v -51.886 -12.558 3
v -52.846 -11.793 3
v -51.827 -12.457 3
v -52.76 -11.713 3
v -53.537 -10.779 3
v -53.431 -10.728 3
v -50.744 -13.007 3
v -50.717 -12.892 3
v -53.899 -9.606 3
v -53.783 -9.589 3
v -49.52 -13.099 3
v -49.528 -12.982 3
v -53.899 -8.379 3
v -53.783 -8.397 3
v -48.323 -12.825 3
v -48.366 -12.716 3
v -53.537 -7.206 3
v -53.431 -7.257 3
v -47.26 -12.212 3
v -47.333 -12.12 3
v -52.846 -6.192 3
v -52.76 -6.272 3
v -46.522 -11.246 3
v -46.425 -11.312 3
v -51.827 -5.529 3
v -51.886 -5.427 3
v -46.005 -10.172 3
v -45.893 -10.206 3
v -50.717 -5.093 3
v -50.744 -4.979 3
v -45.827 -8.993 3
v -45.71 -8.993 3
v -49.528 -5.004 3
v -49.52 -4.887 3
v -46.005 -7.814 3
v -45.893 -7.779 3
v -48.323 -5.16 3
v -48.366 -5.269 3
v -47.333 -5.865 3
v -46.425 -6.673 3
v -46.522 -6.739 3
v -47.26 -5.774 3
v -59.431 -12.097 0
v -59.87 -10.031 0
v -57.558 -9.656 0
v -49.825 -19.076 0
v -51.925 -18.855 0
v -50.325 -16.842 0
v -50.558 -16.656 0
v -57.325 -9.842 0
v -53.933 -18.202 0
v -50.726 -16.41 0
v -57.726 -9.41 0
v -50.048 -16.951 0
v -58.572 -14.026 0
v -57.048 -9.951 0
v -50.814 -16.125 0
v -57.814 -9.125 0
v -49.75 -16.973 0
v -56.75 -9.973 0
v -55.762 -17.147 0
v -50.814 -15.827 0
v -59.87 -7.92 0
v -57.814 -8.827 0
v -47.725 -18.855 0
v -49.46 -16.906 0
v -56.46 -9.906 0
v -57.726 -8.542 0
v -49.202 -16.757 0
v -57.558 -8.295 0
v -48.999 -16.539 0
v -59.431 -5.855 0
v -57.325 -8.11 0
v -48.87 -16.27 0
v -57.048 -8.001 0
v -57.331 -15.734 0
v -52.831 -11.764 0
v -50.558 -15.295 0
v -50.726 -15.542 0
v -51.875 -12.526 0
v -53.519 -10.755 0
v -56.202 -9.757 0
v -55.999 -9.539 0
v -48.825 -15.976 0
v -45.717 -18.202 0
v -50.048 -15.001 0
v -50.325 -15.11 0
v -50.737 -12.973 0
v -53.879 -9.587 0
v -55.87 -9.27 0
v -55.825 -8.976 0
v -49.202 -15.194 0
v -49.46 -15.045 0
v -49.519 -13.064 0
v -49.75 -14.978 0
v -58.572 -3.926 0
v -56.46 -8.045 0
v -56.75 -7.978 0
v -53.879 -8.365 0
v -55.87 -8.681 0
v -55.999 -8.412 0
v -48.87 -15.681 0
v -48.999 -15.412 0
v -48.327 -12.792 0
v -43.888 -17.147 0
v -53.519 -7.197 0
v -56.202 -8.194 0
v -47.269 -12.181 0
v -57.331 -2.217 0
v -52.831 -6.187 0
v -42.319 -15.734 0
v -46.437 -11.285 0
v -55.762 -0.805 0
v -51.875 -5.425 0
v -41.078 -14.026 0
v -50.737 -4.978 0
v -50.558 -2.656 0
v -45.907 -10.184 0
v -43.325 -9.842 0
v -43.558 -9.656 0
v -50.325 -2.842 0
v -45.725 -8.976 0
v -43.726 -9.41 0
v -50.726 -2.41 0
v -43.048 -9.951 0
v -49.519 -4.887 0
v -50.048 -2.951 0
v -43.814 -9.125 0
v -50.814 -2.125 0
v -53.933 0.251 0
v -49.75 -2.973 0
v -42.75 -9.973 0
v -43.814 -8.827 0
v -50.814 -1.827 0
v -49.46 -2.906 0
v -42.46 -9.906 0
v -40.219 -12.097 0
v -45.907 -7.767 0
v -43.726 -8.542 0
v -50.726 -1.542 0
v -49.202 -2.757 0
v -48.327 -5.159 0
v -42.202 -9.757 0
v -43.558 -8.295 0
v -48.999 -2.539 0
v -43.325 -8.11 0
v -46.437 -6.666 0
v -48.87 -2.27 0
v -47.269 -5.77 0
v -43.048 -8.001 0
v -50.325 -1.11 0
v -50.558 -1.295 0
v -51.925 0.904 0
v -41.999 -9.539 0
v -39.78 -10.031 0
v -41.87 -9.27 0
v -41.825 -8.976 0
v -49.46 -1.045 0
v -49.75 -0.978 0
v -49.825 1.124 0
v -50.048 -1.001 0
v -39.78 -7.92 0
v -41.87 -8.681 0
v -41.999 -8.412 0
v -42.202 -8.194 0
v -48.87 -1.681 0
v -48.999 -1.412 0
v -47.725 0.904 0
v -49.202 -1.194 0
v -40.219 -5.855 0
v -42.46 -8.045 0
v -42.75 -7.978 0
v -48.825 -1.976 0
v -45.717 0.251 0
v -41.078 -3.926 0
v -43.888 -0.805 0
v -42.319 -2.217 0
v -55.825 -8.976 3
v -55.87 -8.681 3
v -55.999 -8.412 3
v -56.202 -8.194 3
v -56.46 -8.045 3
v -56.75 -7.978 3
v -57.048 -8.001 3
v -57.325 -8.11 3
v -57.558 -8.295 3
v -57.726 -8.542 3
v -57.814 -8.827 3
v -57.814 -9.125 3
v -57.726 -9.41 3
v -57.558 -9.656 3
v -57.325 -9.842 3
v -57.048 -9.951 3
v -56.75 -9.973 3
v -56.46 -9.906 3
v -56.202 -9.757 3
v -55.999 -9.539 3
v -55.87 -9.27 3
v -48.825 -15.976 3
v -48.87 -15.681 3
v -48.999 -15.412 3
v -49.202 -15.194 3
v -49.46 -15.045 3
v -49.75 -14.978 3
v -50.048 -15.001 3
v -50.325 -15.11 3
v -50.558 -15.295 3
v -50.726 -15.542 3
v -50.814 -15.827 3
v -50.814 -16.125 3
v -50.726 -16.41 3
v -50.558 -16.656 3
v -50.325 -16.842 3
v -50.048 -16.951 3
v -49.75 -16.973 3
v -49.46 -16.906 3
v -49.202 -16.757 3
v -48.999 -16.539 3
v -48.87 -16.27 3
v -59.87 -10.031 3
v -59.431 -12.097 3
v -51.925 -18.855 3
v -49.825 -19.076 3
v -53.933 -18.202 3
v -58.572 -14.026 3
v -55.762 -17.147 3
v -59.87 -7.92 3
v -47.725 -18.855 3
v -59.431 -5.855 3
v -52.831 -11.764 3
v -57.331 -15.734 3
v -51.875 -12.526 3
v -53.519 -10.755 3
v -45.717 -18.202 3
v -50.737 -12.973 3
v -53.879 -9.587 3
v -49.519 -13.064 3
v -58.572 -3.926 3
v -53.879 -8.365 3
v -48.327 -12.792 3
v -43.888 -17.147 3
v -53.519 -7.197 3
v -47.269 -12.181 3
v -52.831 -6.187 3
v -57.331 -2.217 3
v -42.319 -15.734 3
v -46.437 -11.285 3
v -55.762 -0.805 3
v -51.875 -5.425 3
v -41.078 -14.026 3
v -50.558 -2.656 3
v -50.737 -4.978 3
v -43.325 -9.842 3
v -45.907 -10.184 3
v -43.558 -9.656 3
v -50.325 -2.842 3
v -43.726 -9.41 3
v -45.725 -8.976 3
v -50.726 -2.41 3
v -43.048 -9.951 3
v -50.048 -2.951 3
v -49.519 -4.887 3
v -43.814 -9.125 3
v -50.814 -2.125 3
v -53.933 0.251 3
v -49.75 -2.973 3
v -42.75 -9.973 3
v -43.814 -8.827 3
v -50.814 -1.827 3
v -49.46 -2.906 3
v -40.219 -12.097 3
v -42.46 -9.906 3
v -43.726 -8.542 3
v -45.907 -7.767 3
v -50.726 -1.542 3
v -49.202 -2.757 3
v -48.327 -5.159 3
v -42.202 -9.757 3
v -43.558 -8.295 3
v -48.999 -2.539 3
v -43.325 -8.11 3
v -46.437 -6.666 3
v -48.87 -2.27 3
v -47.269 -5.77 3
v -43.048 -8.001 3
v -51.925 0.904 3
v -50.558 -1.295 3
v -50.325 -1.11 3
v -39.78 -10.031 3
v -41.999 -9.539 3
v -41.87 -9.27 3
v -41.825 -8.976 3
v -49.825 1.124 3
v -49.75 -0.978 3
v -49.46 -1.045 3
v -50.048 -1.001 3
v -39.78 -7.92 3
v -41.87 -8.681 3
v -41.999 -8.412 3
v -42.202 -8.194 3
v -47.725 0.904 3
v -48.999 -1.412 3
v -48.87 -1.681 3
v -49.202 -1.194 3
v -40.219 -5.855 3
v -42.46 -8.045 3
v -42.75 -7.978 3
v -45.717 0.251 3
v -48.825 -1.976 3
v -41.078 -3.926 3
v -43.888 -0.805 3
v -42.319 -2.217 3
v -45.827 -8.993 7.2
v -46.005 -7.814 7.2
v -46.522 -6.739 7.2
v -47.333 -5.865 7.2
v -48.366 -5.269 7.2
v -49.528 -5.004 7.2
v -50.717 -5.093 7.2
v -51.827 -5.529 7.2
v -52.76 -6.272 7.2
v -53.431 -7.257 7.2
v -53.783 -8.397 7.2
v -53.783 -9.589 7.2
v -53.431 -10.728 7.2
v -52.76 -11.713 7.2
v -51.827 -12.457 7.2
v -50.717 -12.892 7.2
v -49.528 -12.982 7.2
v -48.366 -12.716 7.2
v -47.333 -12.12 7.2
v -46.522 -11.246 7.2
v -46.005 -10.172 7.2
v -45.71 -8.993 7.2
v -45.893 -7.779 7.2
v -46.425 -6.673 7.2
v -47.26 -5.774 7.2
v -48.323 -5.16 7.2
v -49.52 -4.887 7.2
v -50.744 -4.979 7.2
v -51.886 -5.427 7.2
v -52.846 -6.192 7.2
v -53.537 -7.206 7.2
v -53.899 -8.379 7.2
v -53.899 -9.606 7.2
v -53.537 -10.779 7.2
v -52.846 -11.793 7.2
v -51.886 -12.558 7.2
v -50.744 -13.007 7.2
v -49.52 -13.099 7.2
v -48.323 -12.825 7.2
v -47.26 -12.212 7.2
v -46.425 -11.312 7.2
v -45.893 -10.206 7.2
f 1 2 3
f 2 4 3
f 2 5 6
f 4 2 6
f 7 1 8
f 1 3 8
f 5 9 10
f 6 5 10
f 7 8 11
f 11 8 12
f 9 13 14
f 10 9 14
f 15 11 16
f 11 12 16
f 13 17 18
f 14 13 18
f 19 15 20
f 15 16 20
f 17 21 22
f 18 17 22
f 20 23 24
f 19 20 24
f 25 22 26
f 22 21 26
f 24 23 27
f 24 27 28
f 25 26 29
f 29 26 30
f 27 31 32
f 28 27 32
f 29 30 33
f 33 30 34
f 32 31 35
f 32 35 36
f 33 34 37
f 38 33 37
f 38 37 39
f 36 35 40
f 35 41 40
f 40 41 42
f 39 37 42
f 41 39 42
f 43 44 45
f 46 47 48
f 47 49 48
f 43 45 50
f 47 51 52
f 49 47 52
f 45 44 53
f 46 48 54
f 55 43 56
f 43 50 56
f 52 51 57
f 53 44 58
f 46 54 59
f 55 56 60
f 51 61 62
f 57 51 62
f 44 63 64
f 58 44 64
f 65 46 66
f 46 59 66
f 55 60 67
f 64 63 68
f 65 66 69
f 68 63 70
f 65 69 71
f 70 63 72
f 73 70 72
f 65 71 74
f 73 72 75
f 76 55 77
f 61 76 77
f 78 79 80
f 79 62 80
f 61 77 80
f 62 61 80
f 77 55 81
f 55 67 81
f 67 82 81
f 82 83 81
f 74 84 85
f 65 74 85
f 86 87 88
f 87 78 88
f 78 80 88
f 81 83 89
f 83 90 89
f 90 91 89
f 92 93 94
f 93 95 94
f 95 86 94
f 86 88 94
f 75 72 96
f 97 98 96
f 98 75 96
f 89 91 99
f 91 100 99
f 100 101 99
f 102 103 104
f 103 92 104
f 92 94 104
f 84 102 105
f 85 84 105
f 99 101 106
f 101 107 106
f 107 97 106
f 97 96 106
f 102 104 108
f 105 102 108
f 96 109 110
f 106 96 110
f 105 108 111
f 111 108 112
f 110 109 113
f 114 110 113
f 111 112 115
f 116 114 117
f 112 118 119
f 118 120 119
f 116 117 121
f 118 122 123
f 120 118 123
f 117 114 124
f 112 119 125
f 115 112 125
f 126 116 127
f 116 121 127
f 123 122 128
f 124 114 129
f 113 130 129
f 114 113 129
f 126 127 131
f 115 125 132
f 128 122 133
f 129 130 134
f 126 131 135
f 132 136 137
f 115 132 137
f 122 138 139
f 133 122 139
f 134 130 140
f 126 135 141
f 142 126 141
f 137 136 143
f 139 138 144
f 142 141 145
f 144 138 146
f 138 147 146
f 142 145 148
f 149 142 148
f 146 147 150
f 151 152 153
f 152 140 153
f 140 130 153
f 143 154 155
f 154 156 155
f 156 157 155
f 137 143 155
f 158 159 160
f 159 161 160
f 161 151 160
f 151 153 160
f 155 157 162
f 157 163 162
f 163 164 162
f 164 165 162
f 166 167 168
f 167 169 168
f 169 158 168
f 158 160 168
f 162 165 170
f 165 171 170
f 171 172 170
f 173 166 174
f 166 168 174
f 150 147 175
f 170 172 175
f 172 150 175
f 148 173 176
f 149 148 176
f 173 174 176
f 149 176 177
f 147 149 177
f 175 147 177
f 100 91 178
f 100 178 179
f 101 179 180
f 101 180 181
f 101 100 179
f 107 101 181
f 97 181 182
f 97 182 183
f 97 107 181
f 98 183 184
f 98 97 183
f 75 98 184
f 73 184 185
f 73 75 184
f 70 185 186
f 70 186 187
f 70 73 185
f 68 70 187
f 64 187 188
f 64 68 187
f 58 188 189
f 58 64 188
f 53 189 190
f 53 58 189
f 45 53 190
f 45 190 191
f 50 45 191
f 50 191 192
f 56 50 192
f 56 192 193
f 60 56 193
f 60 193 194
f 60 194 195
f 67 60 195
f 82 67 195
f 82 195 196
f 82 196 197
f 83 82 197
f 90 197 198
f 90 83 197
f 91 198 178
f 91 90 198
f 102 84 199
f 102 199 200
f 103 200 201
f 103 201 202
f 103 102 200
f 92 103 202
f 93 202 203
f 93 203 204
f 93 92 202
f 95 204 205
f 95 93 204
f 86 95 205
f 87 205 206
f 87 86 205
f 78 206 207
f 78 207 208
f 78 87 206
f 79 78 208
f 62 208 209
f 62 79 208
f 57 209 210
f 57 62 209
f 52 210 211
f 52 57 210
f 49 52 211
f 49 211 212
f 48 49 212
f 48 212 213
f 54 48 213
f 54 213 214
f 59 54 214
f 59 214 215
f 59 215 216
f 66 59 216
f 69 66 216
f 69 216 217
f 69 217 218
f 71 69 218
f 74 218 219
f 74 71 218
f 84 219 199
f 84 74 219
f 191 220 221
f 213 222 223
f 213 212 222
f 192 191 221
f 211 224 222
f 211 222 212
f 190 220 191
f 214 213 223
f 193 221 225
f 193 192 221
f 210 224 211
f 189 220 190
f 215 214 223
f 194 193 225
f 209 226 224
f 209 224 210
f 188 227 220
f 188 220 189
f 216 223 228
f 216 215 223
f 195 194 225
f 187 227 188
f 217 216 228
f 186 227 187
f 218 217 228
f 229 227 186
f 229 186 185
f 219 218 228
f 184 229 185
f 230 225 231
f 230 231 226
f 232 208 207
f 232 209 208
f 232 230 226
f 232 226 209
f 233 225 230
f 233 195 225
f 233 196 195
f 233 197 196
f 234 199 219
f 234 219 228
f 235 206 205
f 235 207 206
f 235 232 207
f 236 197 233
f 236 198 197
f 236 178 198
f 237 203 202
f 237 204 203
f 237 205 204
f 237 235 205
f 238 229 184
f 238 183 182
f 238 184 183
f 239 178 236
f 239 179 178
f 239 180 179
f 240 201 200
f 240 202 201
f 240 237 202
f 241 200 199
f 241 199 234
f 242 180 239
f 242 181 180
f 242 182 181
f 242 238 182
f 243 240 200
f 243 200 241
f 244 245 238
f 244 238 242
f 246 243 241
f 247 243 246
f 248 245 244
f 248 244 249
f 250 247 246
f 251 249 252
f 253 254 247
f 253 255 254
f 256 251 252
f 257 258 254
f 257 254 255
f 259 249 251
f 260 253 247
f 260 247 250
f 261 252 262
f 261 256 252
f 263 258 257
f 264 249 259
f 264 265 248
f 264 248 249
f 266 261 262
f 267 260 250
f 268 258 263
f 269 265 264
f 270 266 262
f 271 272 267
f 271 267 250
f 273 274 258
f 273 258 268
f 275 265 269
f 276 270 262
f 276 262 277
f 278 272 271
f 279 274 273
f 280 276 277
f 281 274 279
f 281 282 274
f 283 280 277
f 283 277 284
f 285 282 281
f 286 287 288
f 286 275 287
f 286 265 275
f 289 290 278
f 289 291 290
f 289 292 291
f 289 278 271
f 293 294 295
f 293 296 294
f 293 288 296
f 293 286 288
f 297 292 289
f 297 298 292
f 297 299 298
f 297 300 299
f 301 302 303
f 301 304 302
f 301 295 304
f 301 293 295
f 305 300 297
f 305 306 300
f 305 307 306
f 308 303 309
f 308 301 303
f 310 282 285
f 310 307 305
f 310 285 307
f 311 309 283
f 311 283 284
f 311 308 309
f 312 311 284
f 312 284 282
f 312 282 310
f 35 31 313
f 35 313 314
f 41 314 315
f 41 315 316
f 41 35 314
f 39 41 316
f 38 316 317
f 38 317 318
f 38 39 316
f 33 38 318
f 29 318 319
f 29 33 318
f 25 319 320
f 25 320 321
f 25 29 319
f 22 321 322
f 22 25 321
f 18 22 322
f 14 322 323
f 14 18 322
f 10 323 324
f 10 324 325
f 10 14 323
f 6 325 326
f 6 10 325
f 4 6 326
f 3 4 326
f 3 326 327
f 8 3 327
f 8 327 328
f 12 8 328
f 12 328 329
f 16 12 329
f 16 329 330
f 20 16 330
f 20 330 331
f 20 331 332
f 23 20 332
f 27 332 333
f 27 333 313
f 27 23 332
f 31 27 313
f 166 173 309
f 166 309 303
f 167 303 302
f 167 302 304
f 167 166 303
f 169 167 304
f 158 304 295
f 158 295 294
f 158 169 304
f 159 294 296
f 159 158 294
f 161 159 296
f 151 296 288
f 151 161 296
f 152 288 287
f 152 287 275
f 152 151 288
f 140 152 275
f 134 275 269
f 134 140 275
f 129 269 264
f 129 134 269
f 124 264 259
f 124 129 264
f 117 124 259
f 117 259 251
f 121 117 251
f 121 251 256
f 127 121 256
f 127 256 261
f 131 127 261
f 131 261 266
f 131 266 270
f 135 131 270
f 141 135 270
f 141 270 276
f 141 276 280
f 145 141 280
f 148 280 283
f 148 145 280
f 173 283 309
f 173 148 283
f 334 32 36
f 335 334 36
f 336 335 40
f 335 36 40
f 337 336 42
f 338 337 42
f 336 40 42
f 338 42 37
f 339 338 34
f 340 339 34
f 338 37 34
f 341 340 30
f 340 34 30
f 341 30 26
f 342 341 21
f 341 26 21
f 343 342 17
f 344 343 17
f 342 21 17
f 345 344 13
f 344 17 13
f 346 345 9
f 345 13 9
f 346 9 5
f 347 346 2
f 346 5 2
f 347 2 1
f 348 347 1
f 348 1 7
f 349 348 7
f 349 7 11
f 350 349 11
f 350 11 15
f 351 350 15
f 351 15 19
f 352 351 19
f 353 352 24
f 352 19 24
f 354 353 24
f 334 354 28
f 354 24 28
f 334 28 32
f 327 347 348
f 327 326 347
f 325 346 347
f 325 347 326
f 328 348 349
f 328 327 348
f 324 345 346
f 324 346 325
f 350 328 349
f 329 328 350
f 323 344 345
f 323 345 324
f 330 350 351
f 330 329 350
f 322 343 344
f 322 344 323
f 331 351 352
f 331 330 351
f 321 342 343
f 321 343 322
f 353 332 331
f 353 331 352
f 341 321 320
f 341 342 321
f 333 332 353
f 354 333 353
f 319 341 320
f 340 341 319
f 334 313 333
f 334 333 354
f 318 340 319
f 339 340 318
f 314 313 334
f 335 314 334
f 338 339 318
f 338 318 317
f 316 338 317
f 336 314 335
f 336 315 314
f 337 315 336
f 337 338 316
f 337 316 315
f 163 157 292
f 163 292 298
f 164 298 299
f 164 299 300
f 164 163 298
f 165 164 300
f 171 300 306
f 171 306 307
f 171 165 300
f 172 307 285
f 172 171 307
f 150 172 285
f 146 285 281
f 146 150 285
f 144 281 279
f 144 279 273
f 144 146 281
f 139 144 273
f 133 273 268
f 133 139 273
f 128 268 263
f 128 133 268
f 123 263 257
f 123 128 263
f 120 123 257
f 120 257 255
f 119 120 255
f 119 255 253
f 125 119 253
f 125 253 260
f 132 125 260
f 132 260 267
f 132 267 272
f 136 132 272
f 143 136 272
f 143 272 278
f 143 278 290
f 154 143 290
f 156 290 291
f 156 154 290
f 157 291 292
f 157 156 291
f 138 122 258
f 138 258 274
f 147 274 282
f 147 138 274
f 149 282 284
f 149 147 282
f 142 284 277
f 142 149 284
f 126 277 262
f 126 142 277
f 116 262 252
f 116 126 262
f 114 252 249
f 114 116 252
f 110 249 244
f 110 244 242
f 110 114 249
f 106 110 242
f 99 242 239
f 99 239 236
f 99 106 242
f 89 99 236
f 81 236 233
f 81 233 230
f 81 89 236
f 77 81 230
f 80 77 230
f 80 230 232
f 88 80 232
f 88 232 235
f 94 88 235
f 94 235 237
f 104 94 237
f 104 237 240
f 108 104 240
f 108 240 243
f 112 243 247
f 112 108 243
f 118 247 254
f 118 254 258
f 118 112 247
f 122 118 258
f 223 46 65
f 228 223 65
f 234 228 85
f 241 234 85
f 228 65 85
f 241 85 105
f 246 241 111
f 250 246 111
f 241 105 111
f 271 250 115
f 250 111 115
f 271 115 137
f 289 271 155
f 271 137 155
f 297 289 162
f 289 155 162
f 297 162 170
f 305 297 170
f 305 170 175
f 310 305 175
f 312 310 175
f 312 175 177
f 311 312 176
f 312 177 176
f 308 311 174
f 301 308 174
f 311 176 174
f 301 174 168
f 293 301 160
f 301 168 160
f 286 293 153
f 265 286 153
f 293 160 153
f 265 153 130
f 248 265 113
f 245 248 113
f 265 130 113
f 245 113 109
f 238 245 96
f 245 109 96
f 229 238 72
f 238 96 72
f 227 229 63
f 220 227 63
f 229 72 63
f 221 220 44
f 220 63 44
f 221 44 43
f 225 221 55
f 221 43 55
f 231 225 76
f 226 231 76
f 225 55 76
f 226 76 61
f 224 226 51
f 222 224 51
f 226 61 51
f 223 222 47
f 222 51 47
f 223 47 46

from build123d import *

# Parameters (mm, degrees)
IZIM1_R                     = 1
IZIM1_R_2                   = 4.1
Y_KSEKLIK_EKSTR_ZYON1_DEPTH = 3
IZIM4_R                     = 4.117295272
IZIM4_R_2                   = 4
Y_KSEKLIK_EKSTR_ZYON4_DEPTH = 4.2


with BuildPart() as part:
    # Çizim1 → Yükseklik-Ekstrüzyon1 (new body)
    with BuildSketch(Plane.XY):
        with BuildLine():
            ThreePointArc((-49.825075544, 1.124382022), (-59.925075544, -8.975617978), (-49.825075544, -19.075617978))
            ThreePointArc((-49.825075544, -19.075617978), (-39.725075544, -8.975617978), (-49.825075544, 1.124382022))
        make_face()
        with Locations((-49.825075544, -15.975617978)):
            Circle(IZIM1_R, mode=Mode.SUBTRACT)
        with Locations((-56.825075544, -8.975617978)):
            Circle(IZIM1_R, mode=Mode.SUBTRACT)
        with Locations((-49.825075544, -1.975617978)):
            Circle(IZIM1_R, mode=Mode.SUBTRACT)
        with Locations((-42.825075544, -8.975617978)):
            Circle(IZIM1_R, mode=Mode.SUBTRACT)
        with Locations((-49.825075544, -8.975617978)):
            Circle(IZIM1_R_2, mode=Mode.SUBTRACT)
    extrude(amount=Y_KSEKLIK_EKSTR_ZYON1_DEPTH)


with BuildPart() as body_2:
    # Çizim4 → Yükseklik-Ekstrüzyon4 (new body)
    with BuildSketch(Plane.XY.offset(3)):
        with Locations((-49.827317292, -8.992767351)):
            Circle(IZIM4_R)
        with Locations((-49.827317292, -8.992767351)):
            Circle(IZIM4_R_2, mode=Mode.SUBTRACT)
    extrude(amount=Y_KSEKLIK_EKSTR_ZYON4_DEPTH)


solid = Compound([part.part, body_2.part])
